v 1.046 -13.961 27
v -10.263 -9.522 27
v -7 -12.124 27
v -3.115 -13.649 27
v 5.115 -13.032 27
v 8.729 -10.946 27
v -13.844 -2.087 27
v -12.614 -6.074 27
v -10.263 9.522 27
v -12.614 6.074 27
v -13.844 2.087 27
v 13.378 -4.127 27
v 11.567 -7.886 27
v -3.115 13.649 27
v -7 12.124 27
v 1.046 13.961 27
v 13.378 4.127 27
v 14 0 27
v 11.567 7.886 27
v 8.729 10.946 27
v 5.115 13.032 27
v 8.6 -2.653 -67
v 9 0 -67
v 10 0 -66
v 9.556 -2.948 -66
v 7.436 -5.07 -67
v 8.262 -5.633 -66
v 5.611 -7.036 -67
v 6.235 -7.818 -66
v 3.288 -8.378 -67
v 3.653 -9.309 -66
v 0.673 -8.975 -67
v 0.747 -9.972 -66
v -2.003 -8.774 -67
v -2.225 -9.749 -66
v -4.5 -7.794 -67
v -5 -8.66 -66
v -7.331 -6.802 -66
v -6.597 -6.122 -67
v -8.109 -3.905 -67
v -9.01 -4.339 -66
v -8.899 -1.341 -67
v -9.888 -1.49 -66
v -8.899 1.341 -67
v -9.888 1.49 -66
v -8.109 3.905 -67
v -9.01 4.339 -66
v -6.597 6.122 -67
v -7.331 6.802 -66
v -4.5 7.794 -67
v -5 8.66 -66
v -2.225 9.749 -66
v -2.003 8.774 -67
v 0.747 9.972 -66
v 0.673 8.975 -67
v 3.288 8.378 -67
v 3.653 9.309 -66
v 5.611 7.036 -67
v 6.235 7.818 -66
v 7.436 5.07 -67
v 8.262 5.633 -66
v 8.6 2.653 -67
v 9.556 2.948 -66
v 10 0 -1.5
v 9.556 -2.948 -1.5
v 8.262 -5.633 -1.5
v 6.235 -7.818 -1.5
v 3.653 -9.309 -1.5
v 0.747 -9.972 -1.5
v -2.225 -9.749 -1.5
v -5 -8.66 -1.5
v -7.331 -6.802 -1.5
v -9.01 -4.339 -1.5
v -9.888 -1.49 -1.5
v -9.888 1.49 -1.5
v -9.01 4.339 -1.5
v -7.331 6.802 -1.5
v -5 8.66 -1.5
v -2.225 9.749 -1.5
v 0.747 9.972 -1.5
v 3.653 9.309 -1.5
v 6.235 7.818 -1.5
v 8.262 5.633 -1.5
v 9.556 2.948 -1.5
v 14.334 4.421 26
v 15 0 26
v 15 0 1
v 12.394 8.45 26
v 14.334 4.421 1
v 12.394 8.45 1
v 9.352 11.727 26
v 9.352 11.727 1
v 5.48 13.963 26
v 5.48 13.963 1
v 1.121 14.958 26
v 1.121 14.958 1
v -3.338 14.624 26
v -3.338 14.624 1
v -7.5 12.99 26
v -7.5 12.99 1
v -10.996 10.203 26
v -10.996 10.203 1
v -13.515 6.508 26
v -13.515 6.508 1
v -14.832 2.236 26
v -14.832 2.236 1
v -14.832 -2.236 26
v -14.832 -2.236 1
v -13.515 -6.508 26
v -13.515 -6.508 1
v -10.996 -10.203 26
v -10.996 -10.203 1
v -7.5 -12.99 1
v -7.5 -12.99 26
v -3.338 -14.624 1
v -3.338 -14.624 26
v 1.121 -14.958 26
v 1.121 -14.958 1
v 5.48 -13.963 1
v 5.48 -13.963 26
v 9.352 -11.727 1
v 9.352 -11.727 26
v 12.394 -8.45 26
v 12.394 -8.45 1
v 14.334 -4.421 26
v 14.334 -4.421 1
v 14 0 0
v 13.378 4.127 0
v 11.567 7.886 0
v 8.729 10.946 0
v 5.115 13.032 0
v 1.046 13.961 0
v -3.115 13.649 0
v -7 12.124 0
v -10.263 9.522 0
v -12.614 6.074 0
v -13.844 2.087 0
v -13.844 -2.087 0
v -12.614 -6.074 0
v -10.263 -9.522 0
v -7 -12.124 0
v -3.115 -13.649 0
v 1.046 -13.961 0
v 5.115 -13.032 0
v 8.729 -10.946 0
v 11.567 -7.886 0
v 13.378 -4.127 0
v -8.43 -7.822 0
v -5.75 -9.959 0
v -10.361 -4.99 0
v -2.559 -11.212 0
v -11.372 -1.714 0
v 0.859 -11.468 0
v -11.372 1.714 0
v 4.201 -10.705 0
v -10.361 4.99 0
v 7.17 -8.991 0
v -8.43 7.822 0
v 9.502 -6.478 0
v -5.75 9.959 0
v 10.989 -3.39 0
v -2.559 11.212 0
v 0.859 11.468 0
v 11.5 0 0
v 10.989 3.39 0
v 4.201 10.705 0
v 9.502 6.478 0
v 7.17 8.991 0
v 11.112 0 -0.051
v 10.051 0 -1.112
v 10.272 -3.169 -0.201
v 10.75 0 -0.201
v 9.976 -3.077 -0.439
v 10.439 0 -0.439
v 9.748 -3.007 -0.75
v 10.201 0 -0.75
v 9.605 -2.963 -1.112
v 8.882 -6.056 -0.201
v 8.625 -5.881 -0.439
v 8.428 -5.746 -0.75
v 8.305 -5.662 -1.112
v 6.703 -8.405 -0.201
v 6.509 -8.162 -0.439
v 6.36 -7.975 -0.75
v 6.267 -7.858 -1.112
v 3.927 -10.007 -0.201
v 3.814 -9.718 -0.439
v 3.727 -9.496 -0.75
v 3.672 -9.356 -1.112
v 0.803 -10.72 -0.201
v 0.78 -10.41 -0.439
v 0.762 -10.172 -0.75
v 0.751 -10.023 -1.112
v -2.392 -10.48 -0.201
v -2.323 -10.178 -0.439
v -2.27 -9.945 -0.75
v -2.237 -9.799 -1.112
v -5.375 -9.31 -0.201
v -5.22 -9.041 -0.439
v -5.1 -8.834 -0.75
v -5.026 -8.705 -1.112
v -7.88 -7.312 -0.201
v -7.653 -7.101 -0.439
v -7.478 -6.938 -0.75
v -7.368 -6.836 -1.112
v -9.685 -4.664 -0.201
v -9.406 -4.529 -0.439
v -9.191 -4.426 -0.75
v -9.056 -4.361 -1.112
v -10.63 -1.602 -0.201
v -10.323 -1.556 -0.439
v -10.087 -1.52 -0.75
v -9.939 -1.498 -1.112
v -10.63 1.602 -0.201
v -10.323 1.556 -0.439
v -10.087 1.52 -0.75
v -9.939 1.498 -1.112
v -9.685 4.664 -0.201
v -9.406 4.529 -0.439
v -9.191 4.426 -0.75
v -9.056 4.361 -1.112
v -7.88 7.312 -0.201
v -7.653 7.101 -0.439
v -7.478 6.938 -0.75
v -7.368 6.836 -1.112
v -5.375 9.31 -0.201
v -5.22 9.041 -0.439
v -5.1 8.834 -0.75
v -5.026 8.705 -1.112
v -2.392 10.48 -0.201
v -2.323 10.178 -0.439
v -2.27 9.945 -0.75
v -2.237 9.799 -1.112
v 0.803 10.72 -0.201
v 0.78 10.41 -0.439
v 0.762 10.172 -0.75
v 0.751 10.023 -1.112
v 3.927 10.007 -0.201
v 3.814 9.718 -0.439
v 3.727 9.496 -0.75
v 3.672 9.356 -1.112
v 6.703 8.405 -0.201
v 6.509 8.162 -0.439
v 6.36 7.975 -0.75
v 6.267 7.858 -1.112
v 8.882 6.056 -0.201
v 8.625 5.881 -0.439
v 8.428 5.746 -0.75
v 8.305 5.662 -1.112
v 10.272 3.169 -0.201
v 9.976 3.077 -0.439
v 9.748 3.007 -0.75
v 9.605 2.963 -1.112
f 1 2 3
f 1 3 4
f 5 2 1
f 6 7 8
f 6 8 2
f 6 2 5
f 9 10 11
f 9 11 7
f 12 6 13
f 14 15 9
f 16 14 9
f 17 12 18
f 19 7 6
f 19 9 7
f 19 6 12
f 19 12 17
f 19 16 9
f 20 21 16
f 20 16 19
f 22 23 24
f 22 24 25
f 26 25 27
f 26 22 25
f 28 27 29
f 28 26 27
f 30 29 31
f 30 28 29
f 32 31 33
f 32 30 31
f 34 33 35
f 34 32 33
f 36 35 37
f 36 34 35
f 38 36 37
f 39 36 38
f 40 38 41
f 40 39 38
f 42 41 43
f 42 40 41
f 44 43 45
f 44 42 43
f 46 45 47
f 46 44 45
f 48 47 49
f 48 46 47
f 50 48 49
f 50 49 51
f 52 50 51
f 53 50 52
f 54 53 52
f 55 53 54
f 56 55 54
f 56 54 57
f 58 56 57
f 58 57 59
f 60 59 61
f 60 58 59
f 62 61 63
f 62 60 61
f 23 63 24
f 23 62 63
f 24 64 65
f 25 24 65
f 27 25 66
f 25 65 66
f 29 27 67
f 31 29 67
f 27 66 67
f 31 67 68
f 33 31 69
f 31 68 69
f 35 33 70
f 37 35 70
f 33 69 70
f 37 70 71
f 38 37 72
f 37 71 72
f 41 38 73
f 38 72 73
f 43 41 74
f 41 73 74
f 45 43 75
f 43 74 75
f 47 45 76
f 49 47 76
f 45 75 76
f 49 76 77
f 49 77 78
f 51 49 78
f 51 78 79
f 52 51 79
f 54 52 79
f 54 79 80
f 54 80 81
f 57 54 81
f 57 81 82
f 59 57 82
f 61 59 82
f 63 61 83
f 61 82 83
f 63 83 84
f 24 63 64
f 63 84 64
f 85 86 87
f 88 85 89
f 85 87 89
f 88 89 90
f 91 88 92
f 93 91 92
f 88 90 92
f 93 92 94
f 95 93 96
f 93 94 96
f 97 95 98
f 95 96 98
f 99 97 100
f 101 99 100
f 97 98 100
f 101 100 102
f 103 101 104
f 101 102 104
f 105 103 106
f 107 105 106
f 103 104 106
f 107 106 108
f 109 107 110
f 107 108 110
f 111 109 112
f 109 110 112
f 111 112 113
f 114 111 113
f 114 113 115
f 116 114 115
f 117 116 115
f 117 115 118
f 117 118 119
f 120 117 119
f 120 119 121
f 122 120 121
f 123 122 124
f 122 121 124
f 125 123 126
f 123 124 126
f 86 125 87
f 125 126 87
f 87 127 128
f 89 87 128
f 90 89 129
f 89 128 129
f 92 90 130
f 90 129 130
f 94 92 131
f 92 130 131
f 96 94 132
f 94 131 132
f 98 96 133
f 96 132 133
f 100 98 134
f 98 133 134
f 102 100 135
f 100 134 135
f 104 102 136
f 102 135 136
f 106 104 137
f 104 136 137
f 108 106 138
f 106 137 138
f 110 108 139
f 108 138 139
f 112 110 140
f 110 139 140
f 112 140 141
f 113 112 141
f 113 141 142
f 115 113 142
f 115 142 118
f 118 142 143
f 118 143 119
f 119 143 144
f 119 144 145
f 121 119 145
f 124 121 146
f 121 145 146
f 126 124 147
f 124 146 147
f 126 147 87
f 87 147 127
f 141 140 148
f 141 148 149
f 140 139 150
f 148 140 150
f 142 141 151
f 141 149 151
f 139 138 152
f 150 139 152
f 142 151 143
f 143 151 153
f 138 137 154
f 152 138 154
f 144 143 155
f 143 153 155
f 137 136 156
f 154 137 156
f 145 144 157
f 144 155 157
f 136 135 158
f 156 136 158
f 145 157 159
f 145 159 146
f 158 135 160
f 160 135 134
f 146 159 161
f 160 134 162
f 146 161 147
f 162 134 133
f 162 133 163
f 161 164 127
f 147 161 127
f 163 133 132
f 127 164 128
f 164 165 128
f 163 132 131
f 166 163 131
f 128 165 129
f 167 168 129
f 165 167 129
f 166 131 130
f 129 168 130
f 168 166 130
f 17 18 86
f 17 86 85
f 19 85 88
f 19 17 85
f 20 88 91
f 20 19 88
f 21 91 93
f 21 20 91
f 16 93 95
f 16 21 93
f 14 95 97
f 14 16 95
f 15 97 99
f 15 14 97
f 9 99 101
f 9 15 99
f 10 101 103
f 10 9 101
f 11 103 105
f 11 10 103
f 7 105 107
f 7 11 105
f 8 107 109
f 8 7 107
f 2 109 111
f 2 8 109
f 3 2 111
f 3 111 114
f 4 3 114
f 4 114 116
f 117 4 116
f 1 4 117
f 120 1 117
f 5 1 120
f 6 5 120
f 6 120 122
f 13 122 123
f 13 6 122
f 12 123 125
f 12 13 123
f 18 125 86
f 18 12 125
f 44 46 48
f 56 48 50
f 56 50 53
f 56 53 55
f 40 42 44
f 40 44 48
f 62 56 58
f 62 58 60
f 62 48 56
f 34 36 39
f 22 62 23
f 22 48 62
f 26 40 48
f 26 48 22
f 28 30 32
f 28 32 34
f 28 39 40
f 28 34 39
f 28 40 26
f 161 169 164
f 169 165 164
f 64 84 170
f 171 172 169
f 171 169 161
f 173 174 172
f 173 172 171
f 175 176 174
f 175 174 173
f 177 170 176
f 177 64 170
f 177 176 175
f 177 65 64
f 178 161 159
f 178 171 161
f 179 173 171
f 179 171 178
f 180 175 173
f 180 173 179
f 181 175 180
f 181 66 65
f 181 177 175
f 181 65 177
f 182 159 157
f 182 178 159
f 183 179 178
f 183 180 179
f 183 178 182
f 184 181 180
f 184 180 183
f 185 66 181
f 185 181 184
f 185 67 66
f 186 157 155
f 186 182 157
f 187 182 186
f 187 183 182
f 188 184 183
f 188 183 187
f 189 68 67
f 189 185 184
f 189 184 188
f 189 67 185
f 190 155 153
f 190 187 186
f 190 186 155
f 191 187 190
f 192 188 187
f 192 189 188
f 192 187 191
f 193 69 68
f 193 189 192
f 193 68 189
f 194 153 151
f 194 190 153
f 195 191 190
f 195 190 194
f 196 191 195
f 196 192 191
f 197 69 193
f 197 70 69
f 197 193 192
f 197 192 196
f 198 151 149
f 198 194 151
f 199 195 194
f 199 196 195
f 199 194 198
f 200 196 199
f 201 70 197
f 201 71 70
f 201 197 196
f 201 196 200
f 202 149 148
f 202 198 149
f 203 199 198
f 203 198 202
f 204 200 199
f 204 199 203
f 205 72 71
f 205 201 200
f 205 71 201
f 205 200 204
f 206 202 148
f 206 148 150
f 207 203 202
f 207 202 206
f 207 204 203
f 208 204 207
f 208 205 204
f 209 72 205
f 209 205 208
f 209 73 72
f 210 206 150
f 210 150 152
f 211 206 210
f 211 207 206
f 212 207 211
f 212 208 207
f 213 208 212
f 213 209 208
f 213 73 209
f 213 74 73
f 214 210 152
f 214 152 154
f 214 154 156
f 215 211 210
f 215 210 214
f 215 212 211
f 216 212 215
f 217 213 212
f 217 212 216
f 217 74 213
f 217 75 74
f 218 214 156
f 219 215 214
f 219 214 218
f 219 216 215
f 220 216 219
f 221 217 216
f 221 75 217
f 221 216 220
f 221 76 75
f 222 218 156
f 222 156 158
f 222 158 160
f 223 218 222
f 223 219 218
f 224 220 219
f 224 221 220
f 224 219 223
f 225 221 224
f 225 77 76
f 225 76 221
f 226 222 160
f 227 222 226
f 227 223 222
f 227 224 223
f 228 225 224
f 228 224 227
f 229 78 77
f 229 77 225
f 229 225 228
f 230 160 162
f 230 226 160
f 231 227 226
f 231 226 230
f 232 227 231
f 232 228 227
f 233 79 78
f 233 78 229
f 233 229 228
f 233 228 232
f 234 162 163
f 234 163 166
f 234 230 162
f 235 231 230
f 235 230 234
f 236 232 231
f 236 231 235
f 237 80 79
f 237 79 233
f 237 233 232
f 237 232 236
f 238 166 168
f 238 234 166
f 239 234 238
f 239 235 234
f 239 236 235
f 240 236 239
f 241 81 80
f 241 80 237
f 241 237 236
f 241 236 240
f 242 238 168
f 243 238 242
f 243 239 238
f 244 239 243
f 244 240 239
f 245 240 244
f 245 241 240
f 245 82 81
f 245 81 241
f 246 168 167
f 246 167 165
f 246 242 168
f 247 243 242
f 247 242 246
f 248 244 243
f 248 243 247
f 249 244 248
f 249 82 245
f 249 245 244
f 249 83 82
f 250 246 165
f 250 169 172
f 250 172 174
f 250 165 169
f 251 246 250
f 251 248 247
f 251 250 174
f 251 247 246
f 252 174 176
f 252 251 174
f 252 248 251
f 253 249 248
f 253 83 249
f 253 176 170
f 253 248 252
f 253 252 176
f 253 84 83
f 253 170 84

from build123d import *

# Parameters (mm, degrees)
ESQUISSE1_R        = 15
BOSS_EXTRU_1_DEPTH = 27
ESQUISSE2_R        = 10
BOSS_EXTRU_2_DEPTH = 67
CHANFREIN1_SIZE    = 1
CONG_1_R           = 1.5


with BuildPart() as part:
    # Esquisse1 → Boss.-Extru.1 (new body)
    with BuildSketch(Plane.XY):
        Circle(ESQUISSE1_R)
    extrude(amount=BOSS_EXTRU_1_DEPTH)

    # Esquisse2 → Boss.-Extru.2 (add)
    with BuildSketch(Plane(origin=(0, 0, 0), x_dir=(-1, 0, 0), z_dir=(0, 0, -1))):
        with Locations(Location((0, 0, 0), (0, 0, 180))):  # turned: the seam where the file's is
            Circle(ESQUISSE2_R)
    extrude(amount=BOSS_EXTRU_2_DEPTH)

    # Chanfrein1
    chanfrein1_edges = [part.edges().sort_by_distance(p)[0] for p in [
        (-15, 0, 0),
        (-15, 0, 27),
        (-10, 0, -67),
    ]]
    chamfer(chanfrein1_edges, length=CHANFREIN1_SIZE)

    # Congé1
    cong_1_edges = [part.edges().sort_by_distance(p)[0] for p in [
        (-10, 0, 0),
    ]]
    fillet(cong_1_edges, radius=CONG_1_R)


solid = part.part
